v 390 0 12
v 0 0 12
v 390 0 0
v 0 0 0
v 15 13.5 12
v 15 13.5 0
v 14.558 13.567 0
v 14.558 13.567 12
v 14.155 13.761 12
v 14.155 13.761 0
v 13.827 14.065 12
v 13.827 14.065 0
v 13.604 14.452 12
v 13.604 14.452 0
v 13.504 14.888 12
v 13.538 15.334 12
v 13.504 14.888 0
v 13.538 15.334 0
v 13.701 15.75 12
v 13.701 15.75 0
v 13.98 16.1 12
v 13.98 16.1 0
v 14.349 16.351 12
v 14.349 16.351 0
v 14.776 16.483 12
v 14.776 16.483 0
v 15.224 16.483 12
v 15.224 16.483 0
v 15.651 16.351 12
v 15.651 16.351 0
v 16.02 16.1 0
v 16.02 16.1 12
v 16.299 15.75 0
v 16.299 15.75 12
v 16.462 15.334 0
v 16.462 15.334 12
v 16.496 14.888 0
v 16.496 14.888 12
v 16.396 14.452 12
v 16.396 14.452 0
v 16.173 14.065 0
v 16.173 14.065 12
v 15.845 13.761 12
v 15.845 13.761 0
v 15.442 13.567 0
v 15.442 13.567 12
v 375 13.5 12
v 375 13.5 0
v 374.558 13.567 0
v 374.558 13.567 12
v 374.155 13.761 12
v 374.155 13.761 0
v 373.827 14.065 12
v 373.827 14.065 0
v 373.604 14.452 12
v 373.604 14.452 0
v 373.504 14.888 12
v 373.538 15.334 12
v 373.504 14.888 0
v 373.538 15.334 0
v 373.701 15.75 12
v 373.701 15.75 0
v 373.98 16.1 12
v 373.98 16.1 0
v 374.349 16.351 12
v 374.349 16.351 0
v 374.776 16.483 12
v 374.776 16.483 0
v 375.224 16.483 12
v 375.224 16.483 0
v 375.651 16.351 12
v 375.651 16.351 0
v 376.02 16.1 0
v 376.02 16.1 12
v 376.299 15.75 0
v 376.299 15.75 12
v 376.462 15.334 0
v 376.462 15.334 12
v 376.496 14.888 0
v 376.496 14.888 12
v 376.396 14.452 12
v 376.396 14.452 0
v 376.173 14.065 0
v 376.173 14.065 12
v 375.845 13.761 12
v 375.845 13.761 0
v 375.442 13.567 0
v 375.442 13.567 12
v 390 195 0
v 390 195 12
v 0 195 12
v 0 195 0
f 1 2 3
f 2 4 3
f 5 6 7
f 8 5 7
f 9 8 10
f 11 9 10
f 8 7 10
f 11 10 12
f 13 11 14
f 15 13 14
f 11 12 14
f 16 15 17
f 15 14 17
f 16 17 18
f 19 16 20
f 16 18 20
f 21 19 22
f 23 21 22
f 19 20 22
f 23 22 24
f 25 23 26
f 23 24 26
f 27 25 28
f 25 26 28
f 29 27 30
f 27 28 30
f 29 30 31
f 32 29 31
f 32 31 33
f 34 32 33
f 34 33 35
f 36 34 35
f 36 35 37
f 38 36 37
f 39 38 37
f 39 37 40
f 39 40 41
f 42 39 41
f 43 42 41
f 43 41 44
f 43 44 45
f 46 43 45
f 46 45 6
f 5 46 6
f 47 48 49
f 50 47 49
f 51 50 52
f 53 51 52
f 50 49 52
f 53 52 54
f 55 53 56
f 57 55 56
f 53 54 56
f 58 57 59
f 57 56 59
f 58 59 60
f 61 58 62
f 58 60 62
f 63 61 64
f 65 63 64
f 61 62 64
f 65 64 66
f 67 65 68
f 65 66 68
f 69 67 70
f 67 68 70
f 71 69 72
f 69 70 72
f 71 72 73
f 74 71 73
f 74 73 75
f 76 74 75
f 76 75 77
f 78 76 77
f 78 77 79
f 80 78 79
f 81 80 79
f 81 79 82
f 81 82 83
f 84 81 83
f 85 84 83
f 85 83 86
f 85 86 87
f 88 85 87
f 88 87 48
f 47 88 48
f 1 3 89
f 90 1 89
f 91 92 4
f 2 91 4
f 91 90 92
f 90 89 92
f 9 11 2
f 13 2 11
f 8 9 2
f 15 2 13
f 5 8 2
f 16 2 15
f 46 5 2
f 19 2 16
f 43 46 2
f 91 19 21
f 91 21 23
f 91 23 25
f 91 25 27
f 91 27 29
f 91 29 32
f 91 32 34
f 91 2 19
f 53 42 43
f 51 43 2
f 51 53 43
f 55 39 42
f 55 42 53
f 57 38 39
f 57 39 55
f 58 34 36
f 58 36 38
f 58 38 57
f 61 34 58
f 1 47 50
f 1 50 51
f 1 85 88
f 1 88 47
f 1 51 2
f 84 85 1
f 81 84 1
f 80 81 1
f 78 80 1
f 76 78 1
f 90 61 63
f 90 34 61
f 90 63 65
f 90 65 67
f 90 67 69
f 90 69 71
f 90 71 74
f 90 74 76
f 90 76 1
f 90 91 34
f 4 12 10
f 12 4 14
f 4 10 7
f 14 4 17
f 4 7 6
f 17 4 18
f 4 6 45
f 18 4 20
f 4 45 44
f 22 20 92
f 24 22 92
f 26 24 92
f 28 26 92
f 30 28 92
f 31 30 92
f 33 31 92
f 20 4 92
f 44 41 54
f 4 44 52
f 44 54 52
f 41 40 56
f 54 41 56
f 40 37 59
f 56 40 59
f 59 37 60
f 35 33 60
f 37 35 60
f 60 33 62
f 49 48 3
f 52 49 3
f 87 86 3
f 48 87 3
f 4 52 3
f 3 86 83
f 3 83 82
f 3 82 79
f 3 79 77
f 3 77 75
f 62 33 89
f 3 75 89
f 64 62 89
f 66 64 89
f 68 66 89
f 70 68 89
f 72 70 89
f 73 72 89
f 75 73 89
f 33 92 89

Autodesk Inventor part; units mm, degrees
ref_plane "YZ Plane" through (0, 0, 0) normal (1, 0, 0) x (0, 1, 0)
ref_plane "XZ Plane" through (0, 0, 0) normal (0, 1, 0) x (-1, 0, 0)
ref_plane "XY Plane" through (0, 0, 0) normal (0, 0, 1) x (1, 0, 0)
sketch "Sketch1" plane through (0, 0, 0) normal (0, 0, 1) x (1, 0, 0)
  line L0 (0, 0) -> (390, 0)
  line L1 (390, 0) -> (390, 195)
  line L2 (390, 195) -> (0, 195)
  line L3 (0, 195) -> (0, 0)
  dimension "d0" = 390
  dimension "d1" = 195
extrude "Extrusion1" add sketch "Sketch1" along normal blind 12
hole "Hole1" at (15, 15, 12) direction (0, 0, -1) diameter 3 end through all
pattern_linear "Rectangular Pattern1" count 2 spacing 200 along (0, 1, 0) count 2 spacing 360 along (1, 0, 0) of "Hole1"
properties part number "placa 12mm suport electronica"
